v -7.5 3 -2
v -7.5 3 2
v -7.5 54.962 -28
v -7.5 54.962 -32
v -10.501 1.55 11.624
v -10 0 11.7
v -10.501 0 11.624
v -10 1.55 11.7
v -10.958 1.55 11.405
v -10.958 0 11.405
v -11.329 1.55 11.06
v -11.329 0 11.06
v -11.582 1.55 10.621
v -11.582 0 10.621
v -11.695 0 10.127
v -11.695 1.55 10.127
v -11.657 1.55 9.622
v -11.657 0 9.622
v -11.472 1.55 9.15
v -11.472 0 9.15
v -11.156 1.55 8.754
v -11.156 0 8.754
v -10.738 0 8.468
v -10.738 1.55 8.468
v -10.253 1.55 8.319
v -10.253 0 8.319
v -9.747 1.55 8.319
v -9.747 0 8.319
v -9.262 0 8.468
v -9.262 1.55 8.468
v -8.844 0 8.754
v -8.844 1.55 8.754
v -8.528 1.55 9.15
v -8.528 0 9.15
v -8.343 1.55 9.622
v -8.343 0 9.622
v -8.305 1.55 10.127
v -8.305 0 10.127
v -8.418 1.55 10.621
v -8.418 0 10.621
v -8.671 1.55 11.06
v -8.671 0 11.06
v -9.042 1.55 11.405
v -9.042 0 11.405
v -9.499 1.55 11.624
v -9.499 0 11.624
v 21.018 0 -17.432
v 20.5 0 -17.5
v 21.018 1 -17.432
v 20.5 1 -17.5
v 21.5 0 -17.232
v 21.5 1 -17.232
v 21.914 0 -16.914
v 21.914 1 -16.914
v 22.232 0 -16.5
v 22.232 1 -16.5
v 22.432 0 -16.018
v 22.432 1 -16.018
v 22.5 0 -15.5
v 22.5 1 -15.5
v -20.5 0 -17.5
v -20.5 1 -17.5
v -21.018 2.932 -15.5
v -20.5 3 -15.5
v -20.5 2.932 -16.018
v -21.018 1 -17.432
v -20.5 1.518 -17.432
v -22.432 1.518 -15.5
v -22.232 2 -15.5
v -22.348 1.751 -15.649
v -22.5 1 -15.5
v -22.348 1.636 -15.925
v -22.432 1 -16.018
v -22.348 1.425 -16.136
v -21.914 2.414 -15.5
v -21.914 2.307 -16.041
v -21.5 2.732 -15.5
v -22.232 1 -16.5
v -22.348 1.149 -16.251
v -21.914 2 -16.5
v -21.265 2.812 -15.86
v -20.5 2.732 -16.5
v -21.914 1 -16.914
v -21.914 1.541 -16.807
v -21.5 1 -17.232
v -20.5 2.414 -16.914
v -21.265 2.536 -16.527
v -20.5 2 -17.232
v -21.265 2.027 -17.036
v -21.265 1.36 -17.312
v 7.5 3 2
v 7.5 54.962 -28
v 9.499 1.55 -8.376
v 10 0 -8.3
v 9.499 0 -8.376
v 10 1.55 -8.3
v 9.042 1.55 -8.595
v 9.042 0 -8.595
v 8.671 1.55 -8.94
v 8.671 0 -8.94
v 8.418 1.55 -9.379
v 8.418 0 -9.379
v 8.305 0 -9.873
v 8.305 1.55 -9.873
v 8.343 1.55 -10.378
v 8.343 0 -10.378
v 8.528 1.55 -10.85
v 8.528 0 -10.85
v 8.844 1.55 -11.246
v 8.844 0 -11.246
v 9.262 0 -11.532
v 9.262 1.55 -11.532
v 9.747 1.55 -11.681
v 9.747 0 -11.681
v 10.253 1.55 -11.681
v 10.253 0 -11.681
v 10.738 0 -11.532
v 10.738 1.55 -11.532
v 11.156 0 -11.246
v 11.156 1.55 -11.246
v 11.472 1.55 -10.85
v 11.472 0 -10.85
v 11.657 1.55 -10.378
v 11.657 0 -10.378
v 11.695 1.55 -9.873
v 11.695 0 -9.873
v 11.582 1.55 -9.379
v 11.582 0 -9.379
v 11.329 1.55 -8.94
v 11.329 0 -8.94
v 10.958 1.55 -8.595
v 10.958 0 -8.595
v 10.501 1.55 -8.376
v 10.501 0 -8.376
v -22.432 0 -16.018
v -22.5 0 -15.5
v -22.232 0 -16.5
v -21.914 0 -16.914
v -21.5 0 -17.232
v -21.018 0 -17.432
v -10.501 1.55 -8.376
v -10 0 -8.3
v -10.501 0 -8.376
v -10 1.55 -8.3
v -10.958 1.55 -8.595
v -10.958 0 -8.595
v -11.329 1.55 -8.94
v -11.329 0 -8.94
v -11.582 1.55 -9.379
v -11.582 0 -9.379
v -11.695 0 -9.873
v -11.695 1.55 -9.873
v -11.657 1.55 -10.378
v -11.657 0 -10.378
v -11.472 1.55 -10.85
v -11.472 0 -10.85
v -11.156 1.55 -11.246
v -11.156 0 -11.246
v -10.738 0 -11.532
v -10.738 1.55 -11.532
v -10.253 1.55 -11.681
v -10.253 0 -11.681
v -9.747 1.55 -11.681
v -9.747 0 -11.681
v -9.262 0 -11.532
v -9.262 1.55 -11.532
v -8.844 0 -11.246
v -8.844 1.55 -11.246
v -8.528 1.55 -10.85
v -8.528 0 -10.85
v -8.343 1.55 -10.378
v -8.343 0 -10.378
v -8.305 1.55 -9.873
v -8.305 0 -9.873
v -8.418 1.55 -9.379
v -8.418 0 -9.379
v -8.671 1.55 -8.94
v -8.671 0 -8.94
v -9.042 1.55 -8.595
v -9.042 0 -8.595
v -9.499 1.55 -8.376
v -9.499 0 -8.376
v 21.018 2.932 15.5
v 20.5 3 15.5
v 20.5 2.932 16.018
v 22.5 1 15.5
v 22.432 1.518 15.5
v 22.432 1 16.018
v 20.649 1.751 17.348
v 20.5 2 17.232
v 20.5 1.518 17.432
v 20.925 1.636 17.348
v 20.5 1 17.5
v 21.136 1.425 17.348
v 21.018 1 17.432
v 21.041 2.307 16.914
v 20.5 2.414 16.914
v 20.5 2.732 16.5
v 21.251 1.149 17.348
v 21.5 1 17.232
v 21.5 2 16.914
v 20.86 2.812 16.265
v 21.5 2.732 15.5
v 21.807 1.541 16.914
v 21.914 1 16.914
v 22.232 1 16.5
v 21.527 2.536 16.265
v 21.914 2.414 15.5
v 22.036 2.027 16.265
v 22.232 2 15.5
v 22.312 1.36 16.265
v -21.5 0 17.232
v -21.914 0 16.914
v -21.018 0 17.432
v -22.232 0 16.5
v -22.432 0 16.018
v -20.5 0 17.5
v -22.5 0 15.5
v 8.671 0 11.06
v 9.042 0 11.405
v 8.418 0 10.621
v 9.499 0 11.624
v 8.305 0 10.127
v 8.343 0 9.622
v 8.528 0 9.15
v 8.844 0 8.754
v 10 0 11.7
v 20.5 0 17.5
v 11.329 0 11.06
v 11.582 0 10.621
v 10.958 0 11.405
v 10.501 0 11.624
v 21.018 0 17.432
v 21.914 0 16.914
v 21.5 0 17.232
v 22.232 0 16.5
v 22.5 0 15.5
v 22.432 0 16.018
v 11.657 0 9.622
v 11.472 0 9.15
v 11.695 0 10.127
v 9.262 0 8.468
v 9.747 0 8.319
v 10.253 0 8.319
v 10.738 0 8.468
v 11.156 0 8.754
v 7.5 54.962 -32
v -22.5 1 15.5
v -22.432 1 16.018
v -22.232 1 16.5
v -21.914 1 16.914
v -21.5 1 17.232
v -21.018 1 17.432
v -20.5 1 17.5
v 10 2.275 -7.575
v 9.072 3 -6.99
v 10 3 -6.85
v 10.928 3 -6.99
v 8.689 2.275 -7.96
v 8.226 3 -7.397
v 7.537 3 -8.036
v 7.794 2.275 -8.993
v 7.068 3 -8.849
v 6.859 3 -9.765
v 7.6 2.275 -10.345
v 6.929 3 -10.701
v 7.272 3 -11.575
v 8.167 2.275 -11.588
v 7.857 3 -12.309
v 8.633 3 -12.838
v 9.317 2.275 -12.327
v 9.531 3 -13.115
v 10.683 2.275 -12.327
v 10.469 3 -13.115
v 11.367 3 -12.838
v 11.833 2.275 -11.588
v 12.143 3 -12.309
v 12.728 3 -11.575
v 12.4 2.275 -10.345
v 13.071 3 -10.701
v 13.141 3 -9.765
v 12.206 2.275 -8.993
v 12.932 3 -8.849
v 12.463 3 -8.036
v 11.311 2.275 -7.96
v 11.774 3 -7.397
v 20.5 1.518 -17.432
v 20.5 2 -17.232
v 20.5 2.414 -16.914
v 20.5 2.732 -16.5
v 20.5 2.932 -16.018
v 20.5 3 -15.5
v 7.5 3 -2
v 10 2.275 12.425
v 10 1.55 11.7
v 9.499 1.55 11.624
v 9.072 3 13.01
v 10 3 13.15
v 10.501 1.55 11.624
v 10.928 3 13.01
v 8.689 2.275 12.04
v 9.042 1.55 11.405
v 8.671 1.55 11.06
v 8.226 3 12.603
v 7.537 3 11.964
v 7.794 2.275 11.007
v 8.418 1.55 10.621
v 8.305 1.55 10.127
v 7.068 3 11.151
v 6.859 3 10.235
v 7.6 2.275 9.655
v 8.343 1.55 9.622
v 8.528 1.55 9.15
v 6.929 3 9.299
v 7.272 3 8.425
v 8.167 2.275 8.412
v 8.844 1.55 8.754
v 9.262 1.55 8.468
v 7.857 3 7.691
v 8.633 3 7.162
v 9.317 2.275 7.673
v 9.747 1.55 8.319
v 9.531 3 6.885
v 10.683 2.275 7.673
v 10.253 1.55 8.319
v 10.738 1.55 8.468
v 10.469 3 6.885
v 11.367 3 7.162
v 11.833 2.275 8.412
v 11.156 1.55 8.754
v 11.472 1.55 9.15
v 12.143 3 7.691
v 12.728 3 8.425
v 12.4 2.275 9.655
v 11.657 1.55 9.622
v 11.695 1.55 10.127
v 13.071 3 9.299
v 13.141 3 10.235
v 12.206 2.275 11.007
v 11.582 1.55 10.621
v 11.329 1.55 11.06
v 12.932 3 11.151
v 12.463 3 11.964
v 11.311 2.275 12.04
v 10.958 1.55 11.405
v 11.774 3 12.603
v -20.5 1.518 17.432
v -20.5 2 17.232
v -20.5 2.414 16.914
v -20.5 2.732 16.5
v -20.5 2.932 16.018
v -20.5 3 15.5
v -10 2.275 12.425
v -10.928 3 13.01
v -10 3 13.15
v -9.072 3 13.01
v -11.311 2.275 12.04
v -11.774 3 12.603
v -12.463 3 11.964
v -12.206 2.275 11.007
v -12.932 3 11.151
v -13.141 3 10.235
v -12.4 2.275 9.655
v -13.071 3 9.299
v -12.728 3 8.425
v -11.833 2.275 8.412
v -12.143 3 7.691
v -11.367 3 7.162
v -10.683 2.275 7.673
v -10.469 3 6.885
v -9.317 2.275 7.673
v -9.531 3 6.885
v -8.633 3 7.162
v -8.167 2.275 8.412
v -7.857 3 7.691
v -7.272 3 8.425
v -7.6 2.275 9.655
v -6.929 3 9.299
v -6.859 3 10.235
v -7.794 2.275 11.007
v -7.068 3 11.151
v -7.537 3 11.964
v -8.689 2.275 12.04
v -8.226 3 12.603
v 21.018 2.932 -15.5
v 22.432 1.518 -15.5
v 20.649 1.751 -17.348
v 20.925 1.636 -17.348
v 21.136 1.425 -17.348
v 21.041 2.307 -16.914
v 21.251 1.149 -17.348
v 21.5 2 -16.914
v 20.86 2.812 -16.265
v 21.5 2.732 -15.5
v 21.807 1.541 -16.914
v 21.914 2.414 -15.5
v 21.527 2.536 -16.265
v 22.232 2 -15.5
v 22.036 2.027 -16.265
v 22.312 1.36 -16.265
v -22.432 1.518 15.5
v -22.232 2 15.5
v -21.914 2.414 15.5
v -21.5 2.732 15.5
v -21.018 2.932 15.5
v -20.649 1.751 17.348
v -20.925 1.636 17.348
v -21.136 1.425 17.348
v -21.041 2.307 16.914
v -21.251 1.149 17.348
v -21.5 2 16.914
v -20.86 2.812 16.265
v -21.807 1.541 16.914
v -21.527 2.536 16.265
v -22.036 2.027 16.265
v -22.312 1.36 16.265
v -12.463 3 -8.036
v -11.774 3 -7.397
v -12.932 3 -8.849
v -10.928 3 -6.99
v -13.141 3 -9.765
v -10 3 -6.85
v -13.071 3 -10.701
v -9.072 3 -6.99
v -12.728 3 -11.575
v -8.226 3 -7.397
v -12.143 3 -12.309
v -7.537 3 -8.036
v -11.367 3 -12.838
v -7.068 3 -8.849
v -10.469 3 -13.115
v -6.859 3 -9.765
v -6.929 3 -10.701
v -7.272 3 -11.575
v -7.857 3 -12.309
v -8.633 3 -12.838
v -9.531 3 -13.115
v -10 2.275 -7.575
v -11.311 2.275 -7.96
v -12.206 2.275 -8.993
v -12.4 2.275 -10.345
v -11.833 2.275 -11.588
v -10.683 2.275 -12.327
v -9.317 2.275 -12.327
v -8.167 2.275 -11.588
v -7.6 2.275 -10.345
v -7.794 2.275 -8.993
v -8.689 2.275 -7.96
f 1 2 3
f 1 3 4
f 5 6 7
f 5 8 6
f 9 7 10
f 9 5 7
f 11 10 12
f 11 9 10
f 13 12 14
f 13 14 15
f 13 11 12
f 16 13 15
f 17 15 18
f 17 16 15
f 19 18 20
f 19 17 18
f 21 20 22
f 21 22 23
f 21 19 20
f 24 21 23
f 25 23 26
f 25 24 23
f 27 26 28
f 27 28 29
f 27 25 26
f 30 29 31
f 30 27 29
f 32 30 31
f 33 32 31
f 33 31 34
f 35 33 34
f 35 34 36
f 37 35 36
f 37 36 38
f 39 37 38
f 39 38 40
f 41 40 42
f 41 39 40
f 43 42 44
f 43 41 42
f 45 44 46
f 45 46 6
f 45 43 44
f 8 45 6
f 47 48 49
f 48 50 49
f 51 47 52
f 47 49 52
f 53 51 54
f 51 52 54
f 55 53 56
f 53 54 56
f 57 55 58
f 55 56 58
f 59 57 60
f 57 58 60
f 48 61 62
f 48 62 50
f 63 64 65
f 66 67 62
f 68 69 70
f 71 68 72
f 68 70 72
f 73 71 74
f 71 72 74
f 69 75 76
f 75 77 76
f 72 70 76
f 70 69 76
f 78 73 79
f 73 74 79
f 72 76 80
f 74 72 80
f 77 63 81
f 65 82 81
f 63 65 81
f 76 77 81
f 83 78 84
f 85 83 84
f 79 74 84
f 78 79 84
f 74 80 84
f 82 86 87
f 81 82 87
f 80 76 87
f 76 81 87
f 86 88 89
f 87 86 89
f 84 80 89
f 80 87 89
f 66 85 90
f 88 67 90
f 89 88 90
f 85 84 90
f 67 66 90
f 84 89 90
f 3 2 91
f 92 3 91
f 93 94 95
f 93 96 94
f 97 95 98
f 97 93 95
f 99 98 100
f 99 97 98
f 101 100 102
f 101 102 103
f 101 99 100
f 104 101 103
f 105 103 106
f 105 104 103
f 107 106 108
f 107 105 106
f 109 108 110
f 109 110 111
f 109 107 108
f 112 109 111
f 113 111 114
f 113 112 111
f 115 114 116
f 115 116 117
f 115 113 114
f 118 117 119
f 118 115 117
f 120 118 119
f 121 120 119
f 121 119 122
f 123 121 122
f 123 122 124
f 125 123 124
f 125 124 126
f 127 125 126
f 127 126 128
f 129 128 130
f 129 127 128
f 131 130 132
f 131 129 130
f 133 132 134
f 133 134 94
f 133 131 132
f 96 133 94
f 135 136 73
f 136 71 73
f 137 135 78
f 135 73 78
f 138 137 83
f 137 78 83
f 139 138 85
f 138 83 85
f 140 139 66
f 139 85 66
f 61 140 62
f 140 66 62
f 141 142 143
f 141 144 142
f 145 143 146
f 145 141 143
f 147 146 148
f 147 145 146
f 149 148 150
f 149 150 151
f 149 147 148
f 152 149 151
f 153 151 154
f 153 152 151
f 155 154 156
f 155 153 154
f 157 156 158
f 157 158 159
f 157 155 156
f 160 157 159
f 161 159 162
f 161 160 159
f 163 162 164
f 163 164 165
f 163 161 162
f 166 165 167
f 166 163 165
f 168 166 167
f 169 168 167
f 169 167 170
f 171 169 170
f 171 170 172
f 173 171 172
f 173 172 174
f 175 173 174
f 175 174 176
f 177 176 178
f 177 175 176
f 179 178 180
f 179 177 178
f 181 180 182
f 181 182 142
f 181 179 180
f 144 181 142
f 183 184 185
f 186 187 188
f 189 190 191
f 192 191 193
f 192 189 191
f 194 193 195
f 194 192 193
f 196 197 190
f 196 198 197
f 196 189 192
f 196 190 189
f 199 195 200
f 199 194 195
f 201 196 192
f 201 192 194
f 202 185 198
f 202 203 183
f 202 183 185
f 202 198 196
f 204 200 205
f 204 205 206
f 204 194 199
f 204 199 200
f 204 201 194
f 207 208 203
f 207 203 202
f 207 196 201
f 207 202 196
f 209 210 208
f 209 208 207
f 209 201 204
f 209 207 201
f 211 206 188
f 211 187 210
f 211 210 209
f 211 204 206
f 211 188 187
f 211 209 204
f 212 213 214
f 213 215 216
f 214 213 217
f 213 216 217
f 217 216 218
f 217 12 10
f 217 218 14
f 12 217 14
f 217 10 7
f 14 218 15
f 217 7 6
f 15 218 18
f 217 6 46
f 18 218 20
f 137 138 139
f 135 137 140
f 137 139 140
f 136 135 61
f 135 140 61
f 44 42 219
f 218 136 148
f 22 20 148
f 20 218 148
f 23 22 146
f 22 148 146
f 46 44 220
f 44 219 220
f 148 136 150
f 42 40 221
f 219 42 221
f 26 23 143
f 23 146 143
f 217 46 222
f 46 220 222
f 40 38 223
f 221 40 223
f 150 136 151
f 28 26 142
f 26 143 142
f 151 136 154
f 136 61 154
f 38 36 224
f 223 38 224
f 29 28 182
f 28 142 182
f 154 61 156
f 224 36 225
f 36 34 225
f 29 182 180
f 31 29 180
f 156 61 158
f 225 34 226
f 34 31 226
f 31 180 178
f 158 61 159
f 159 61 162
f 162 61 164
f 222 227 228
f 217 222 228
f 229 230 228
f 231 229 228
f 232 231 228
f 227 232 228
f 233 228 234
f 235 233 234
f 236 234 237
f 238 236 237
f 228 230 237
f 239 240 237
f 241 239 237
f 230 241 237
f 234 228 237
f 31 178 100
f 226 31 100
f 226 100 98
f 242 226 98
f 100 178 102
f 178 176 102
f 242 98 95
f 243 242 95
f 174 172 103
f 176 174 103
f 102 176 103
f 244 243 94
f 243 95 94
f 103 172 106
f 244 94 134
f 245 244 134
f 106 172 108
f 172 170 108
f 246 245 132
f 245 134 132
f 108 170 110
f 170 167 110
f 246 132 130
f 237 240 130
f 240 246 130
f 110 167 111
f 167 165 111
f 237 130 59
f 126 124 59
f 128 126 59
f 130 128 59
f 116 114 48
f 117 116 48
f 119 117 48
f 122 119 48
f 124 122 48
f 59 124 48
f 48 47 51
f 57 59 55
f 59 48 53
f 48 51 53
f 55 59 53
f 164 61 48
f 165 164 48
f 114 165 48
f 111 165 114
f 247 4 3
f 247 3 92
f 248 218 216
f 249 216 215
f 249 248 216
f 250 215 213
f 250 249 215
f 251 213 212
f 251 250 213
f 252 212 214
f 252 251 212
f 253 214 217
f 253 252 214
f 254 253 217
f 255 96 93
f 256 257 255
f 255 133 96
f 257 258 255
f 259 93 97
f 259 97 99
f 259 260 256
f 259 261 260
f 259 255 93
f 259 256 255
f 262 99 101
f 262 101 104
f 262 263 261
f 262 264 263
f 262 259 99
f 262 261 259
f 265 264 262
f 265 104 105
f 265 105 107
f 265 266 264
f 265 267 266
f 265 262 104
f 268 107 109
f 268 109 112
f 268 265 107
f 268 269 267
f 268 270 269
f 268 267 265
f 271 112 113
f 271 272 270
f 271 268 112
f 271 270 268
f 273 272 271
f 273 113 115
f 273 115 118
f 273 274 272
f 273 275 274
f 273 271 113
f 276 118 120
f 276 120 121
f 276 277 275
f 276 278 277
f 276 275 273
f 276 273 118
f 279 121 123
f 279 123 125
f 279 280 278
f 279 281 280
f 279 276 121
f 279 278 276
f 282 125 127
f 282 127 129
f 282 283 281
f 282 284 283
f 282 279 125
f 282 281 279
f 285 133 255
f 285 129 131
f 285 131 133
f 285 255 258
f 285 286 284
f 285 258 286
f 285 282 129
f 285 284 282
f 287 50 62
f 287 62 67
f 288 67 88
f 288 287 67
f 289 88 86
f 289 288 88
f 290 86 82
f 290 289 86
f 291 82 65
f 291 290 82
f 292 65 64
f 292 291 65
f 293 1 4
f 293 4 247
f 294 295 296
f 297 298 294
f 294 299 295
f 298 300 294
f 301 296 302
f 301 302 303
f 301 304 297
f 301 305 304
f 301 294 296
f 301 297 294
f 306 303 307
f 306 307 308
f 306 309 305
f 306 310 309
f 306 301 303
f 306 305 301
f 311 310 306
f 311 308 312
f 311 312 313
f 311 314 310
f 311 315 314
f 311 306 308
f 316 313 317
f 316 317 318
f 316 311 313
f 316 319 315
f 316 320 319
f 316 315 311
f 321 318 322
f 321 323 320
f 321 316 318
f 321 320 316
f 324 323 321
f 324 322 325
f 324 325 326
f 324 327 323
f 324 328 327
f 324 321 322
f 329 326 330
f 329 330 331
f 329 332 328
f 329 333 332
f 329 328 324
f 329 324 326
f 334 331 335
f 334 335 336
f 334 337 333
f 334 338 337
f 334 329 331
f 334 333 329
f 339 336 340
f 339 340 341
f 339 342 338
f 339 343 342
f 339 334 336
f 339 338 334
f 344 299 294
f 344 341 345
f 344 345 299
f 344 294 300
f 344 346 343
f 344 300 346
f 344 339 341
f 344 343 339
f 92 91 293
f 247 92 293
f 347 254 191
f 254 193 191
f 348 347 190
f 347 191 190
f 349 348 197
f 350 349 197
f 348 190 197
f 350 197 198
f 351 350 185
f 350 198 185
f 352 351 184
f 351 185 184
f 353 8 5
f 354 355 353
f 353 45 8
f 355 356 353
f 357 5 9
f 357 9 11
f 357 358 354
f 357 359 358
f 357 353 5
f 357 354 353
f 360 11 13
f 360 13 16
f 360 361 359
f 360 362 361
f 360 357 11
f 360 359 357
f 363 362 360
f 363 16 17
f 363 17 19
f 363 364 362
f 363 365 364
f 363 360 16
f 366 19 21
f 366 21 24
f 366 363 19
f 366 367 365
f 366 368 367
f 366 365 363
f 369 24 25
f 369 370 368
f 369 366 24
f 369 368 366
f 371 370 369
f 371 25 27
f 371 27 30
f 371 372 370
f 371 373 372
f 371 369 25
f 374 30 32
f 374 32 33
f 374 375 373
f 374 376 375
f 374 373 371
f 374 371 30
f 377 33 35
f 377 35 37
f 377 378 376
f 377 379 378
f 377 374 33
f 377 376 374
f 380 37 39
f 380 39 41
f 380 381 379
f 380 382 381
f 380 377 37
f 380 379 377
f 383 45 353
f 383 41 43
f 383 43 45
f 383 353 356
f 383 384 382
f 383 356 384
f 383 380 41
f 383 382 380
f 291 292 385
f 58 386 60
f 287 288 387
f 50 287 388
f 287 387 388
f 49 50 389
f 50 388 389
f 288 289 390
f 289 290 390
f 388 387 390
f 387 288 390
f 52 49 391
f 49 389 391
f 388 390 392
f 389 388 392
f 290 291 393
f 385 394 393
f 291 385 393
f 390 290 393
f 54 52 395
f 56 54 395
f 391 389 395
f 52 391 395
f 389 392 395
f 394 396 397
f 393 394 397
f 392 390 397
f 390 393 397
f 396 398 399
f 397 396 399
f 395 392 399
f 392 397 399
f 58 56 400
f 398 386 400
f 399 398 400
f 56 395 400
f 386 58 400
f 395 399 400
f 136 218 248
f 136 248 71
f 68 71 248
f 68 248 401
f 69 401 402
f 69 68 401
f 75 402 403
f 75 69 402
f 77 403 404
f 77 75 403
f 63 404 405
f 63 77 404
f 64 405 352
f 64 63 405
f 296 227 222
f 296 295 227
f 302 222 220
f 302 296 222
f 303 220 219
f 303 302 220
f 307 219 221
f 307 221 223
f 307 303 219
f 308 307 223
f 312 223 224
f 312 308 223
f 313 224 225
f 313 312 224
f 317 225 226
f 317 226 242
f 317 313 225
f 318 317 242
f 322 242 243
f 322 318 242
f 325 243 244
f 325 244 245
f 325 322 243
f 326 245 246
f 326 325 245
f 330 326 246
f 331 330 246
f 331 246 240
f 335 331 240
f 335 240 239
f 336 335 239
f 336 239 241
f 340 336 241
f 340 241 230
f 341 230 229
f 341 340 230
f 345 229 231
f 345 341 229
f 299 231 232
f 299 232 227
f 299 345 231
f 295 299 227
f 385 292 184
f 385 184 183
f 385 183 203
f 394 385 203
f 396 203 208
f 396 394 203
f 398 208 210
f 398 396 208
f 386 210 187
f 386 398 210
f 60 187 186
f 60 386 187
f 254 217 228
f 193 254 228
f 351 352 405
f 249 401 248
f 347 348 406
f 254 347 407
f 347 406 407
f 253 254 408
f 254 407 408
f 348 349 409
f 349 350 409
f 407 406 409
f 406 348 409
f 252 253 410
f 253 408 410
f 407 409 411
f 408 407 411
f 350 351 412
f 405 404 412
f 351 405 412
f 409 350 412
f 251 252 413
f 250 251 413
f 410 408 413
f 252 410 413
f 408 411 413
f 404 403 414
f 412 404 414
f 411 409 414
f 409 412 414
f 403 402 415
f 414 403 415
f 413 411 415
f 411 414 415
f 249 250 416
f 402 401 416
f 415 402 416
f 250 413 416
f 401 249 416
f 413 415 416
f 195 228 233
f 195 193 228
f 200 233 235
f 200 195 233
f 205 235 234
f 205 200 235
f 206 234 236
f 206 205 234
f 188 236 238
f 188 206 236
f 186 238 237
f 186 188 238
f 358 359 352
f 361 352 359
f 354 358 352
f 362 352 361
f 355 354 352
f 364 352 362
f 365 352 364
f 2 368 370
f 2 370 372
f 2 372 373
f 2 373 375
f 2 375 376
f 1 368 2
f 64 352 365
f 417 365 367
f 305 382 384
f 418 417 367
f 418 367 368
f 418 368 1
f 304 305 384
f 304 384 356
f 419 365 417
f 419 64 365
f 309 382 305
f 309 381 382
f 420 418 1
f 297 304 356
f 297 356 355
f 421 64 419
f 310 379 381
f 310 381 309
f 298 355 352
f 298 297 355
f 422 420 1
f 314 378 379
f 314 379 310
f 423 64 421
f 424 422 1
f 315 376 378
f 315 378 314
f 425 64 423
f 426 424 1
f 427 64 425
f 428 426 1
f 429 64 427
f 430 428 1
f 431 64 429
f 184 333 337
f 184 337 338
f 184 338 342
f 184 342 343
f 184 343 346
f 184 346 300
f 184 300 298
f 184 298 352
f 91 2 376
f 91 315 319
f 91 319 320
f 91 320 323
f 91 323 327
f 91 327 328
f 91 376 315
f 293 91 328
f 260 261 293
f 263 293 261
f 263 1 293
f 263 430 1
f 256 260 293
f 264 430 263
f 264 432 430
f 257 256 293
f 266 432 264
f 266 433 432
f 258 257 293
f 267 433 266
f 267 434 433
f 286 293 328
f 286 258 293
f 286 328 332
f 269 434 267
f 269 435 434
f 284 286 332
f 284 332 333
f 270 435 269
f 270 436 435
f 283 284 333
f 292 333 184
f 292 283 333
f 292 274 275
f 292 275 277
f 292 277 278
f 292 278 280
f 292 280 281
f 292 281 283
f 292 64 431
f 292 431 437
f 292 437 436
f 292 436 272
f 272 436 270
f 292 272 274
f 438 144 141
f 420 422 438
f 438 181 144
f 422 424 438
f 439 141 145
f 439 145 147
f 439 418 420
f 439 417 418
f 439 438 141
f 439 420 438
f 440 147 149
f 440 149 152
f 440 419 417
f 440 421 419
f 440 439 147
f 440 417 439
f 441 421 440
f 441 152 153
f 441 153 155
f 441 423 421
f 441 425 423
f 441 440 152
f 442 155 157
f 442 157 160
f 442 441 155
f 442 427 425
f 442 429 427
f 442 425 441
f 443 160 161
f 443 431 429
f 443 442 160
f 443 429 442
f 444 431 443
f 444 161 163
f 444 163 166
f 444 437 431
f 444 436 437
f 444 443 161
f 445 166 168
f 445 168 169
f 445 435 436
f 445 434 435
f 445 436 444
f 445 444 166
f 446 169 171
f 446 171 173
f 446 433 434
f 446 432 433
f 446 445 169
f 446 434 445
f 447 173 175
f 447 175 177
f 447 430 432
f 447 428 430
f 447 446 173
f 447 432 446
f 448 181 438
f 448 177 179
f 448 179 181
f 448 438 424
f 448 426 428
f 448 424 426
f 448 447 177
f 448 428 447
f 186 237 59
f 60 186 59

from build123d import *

# Parameters (mm, degrees)
SKETCH1_W                                      = 45
SKETCH1_H                                      = 35
BOSS_EXTRUDE1_DEPTH                            = 3
CSK_FOR_M3_FLAT_HEAD_MACHINE_SCREW2_AT_2_COUNT = 2
CSK_FOR_M3_FLAT_HEAD_MACHINE_SCREW2_AT_2_PITCH = 20
CSK_FOR_M3_FLAT_HEAD_MACHINE_SCREW2_AT_3_COUNT = 2
CSK_FOR_M3_FLAT_HEAD_MACHINE_SCREW2_AT_3_PITCH = 28.284271247
CSK_FOR_M3_FLAT_HEAD_MACHINE_SCREW2_AT_4_COUNT = 2
CSK_FOR_M3_FLAT_HEAD_MACHINE_SCREW2_AT_4_PITCH = 20
SKETCH7_W                                      = 15
SKETCH7_H                                      = 4
BOSS_EXTRUDE2_DEPTH                            = 60
FILLET1_R                                      = 2


with BuildPart() as part:
    # Sketch1 → Boss-Extrude1 (new body)
    with BuildSketch(Plane(origin=(0, 0, 0), x_dir=(1, 0, 0), z_dir=(0, 1, 0))):
        Rectangle(SKETCH1_W, SKETCH1_H)
    extrude(amount=BOSS_EXTRUDE1_DEPTH)

    # Sketch5 → CSK for M3 Flat Head Machine Screw2 (revolve, cut)
    with BuildSketch(Plane(origin=(10, 3, -10), x_dir=(0, 0, 1), z_dir=(1, 0, 0))):
        Polygon((0, 0), (0, 3), (1.7, 3), (1.7, 1.45), (3.15, 0), align=None)
    csk_for_m3_flat_head_machine_screw2 = revolve(axis=Axis((10, 9.35, -10), (0, -1, 0)), mode=Mode.SUBTRACT)

    # CSK for M3 Flat Head Machine Screw2 at 2: CSK for M3 Flat Head Machine Screw2 ×2
    with Locations(*[(-i * CSK_FOR_M3_FLAT_HEAD_MACHINE_SCREW2_AT_2_PITCH, 0, 0) for i in range(1, CSK_FOR_M3_FLAT_HEAD_MACHINE_SCREW2_AT_2_COUNT)]):
        add(csk_for_m3_flat_head_machine_screw2, mode=Mode.SUBTRACT)

    # CSK for M3 Flat Head Machine Screw2 at 3: CSK for M3 Flat Head Machine Screw2 ×2
    with Locations(*[Vector(-0.707106781, 0, 0.707106781) * (i * CSK_FOR_M3_FLAT_HEAD_MACHINE_SCREW2_AT_3_PITCH) for i in range(1, CSK_FOR_M3_FLAT_HEAD_MACHINE_SCREW2_AT_3_COUNT)]):
        add(csk_for_m3_flat_head_machine_screw2, mode=Mode.SUBTRACT)

    # CSK for M3 Flat Head Machine Screw2 at 4: CSK for M3 Flat Head Machine Screw2 ×2
    with Locations(*[(0, 0, i * CSK_FOR_M3_FLAT_HEAD_MACHINE_SCREW2_AT_4_PITCH) for i in range(1, CSK_FOR_M3_FLAT_HEAD_MACHINE_SCREW2_AT_4_COUNT)]):
        add(csk_for_m3_flat_head_machine_screw2, mode=Mode.SUBTRACT)

    # Sketch7 → Boss-Extrude2 (add, along a direction that is not the sketch's normal)
    with BuildSketch(Plane(origin=(0, 3, 0), x_dir=(1, 0, 0), z_dir=(0, 1, 0))):
        Rectangle(SKETCH7_W, SKETCH7_H)
    extrude(amount=BOSS_EXTRUDE2_DEPTH, dir=(0, 0.866025404, -0.5))

    # Fillet1
    fillet1_edges = [part.edges().sort_by_distance(p)[0] for p in [
        (22.5, 3, 0),
        (0, 3, -17.5),
        (-22.5, 3, 0),
        (0, 3, 17.5),
        (-22.5, 1.5, -17.5),
        (22.5, 1.5, -17.5),
        (22.5, 1.5, 17.5),
        (-22.5, 1.5, 17.5),
    ]]
    fillet(fillet1_edges, radius=FILLET1_R)


solid = part.part
